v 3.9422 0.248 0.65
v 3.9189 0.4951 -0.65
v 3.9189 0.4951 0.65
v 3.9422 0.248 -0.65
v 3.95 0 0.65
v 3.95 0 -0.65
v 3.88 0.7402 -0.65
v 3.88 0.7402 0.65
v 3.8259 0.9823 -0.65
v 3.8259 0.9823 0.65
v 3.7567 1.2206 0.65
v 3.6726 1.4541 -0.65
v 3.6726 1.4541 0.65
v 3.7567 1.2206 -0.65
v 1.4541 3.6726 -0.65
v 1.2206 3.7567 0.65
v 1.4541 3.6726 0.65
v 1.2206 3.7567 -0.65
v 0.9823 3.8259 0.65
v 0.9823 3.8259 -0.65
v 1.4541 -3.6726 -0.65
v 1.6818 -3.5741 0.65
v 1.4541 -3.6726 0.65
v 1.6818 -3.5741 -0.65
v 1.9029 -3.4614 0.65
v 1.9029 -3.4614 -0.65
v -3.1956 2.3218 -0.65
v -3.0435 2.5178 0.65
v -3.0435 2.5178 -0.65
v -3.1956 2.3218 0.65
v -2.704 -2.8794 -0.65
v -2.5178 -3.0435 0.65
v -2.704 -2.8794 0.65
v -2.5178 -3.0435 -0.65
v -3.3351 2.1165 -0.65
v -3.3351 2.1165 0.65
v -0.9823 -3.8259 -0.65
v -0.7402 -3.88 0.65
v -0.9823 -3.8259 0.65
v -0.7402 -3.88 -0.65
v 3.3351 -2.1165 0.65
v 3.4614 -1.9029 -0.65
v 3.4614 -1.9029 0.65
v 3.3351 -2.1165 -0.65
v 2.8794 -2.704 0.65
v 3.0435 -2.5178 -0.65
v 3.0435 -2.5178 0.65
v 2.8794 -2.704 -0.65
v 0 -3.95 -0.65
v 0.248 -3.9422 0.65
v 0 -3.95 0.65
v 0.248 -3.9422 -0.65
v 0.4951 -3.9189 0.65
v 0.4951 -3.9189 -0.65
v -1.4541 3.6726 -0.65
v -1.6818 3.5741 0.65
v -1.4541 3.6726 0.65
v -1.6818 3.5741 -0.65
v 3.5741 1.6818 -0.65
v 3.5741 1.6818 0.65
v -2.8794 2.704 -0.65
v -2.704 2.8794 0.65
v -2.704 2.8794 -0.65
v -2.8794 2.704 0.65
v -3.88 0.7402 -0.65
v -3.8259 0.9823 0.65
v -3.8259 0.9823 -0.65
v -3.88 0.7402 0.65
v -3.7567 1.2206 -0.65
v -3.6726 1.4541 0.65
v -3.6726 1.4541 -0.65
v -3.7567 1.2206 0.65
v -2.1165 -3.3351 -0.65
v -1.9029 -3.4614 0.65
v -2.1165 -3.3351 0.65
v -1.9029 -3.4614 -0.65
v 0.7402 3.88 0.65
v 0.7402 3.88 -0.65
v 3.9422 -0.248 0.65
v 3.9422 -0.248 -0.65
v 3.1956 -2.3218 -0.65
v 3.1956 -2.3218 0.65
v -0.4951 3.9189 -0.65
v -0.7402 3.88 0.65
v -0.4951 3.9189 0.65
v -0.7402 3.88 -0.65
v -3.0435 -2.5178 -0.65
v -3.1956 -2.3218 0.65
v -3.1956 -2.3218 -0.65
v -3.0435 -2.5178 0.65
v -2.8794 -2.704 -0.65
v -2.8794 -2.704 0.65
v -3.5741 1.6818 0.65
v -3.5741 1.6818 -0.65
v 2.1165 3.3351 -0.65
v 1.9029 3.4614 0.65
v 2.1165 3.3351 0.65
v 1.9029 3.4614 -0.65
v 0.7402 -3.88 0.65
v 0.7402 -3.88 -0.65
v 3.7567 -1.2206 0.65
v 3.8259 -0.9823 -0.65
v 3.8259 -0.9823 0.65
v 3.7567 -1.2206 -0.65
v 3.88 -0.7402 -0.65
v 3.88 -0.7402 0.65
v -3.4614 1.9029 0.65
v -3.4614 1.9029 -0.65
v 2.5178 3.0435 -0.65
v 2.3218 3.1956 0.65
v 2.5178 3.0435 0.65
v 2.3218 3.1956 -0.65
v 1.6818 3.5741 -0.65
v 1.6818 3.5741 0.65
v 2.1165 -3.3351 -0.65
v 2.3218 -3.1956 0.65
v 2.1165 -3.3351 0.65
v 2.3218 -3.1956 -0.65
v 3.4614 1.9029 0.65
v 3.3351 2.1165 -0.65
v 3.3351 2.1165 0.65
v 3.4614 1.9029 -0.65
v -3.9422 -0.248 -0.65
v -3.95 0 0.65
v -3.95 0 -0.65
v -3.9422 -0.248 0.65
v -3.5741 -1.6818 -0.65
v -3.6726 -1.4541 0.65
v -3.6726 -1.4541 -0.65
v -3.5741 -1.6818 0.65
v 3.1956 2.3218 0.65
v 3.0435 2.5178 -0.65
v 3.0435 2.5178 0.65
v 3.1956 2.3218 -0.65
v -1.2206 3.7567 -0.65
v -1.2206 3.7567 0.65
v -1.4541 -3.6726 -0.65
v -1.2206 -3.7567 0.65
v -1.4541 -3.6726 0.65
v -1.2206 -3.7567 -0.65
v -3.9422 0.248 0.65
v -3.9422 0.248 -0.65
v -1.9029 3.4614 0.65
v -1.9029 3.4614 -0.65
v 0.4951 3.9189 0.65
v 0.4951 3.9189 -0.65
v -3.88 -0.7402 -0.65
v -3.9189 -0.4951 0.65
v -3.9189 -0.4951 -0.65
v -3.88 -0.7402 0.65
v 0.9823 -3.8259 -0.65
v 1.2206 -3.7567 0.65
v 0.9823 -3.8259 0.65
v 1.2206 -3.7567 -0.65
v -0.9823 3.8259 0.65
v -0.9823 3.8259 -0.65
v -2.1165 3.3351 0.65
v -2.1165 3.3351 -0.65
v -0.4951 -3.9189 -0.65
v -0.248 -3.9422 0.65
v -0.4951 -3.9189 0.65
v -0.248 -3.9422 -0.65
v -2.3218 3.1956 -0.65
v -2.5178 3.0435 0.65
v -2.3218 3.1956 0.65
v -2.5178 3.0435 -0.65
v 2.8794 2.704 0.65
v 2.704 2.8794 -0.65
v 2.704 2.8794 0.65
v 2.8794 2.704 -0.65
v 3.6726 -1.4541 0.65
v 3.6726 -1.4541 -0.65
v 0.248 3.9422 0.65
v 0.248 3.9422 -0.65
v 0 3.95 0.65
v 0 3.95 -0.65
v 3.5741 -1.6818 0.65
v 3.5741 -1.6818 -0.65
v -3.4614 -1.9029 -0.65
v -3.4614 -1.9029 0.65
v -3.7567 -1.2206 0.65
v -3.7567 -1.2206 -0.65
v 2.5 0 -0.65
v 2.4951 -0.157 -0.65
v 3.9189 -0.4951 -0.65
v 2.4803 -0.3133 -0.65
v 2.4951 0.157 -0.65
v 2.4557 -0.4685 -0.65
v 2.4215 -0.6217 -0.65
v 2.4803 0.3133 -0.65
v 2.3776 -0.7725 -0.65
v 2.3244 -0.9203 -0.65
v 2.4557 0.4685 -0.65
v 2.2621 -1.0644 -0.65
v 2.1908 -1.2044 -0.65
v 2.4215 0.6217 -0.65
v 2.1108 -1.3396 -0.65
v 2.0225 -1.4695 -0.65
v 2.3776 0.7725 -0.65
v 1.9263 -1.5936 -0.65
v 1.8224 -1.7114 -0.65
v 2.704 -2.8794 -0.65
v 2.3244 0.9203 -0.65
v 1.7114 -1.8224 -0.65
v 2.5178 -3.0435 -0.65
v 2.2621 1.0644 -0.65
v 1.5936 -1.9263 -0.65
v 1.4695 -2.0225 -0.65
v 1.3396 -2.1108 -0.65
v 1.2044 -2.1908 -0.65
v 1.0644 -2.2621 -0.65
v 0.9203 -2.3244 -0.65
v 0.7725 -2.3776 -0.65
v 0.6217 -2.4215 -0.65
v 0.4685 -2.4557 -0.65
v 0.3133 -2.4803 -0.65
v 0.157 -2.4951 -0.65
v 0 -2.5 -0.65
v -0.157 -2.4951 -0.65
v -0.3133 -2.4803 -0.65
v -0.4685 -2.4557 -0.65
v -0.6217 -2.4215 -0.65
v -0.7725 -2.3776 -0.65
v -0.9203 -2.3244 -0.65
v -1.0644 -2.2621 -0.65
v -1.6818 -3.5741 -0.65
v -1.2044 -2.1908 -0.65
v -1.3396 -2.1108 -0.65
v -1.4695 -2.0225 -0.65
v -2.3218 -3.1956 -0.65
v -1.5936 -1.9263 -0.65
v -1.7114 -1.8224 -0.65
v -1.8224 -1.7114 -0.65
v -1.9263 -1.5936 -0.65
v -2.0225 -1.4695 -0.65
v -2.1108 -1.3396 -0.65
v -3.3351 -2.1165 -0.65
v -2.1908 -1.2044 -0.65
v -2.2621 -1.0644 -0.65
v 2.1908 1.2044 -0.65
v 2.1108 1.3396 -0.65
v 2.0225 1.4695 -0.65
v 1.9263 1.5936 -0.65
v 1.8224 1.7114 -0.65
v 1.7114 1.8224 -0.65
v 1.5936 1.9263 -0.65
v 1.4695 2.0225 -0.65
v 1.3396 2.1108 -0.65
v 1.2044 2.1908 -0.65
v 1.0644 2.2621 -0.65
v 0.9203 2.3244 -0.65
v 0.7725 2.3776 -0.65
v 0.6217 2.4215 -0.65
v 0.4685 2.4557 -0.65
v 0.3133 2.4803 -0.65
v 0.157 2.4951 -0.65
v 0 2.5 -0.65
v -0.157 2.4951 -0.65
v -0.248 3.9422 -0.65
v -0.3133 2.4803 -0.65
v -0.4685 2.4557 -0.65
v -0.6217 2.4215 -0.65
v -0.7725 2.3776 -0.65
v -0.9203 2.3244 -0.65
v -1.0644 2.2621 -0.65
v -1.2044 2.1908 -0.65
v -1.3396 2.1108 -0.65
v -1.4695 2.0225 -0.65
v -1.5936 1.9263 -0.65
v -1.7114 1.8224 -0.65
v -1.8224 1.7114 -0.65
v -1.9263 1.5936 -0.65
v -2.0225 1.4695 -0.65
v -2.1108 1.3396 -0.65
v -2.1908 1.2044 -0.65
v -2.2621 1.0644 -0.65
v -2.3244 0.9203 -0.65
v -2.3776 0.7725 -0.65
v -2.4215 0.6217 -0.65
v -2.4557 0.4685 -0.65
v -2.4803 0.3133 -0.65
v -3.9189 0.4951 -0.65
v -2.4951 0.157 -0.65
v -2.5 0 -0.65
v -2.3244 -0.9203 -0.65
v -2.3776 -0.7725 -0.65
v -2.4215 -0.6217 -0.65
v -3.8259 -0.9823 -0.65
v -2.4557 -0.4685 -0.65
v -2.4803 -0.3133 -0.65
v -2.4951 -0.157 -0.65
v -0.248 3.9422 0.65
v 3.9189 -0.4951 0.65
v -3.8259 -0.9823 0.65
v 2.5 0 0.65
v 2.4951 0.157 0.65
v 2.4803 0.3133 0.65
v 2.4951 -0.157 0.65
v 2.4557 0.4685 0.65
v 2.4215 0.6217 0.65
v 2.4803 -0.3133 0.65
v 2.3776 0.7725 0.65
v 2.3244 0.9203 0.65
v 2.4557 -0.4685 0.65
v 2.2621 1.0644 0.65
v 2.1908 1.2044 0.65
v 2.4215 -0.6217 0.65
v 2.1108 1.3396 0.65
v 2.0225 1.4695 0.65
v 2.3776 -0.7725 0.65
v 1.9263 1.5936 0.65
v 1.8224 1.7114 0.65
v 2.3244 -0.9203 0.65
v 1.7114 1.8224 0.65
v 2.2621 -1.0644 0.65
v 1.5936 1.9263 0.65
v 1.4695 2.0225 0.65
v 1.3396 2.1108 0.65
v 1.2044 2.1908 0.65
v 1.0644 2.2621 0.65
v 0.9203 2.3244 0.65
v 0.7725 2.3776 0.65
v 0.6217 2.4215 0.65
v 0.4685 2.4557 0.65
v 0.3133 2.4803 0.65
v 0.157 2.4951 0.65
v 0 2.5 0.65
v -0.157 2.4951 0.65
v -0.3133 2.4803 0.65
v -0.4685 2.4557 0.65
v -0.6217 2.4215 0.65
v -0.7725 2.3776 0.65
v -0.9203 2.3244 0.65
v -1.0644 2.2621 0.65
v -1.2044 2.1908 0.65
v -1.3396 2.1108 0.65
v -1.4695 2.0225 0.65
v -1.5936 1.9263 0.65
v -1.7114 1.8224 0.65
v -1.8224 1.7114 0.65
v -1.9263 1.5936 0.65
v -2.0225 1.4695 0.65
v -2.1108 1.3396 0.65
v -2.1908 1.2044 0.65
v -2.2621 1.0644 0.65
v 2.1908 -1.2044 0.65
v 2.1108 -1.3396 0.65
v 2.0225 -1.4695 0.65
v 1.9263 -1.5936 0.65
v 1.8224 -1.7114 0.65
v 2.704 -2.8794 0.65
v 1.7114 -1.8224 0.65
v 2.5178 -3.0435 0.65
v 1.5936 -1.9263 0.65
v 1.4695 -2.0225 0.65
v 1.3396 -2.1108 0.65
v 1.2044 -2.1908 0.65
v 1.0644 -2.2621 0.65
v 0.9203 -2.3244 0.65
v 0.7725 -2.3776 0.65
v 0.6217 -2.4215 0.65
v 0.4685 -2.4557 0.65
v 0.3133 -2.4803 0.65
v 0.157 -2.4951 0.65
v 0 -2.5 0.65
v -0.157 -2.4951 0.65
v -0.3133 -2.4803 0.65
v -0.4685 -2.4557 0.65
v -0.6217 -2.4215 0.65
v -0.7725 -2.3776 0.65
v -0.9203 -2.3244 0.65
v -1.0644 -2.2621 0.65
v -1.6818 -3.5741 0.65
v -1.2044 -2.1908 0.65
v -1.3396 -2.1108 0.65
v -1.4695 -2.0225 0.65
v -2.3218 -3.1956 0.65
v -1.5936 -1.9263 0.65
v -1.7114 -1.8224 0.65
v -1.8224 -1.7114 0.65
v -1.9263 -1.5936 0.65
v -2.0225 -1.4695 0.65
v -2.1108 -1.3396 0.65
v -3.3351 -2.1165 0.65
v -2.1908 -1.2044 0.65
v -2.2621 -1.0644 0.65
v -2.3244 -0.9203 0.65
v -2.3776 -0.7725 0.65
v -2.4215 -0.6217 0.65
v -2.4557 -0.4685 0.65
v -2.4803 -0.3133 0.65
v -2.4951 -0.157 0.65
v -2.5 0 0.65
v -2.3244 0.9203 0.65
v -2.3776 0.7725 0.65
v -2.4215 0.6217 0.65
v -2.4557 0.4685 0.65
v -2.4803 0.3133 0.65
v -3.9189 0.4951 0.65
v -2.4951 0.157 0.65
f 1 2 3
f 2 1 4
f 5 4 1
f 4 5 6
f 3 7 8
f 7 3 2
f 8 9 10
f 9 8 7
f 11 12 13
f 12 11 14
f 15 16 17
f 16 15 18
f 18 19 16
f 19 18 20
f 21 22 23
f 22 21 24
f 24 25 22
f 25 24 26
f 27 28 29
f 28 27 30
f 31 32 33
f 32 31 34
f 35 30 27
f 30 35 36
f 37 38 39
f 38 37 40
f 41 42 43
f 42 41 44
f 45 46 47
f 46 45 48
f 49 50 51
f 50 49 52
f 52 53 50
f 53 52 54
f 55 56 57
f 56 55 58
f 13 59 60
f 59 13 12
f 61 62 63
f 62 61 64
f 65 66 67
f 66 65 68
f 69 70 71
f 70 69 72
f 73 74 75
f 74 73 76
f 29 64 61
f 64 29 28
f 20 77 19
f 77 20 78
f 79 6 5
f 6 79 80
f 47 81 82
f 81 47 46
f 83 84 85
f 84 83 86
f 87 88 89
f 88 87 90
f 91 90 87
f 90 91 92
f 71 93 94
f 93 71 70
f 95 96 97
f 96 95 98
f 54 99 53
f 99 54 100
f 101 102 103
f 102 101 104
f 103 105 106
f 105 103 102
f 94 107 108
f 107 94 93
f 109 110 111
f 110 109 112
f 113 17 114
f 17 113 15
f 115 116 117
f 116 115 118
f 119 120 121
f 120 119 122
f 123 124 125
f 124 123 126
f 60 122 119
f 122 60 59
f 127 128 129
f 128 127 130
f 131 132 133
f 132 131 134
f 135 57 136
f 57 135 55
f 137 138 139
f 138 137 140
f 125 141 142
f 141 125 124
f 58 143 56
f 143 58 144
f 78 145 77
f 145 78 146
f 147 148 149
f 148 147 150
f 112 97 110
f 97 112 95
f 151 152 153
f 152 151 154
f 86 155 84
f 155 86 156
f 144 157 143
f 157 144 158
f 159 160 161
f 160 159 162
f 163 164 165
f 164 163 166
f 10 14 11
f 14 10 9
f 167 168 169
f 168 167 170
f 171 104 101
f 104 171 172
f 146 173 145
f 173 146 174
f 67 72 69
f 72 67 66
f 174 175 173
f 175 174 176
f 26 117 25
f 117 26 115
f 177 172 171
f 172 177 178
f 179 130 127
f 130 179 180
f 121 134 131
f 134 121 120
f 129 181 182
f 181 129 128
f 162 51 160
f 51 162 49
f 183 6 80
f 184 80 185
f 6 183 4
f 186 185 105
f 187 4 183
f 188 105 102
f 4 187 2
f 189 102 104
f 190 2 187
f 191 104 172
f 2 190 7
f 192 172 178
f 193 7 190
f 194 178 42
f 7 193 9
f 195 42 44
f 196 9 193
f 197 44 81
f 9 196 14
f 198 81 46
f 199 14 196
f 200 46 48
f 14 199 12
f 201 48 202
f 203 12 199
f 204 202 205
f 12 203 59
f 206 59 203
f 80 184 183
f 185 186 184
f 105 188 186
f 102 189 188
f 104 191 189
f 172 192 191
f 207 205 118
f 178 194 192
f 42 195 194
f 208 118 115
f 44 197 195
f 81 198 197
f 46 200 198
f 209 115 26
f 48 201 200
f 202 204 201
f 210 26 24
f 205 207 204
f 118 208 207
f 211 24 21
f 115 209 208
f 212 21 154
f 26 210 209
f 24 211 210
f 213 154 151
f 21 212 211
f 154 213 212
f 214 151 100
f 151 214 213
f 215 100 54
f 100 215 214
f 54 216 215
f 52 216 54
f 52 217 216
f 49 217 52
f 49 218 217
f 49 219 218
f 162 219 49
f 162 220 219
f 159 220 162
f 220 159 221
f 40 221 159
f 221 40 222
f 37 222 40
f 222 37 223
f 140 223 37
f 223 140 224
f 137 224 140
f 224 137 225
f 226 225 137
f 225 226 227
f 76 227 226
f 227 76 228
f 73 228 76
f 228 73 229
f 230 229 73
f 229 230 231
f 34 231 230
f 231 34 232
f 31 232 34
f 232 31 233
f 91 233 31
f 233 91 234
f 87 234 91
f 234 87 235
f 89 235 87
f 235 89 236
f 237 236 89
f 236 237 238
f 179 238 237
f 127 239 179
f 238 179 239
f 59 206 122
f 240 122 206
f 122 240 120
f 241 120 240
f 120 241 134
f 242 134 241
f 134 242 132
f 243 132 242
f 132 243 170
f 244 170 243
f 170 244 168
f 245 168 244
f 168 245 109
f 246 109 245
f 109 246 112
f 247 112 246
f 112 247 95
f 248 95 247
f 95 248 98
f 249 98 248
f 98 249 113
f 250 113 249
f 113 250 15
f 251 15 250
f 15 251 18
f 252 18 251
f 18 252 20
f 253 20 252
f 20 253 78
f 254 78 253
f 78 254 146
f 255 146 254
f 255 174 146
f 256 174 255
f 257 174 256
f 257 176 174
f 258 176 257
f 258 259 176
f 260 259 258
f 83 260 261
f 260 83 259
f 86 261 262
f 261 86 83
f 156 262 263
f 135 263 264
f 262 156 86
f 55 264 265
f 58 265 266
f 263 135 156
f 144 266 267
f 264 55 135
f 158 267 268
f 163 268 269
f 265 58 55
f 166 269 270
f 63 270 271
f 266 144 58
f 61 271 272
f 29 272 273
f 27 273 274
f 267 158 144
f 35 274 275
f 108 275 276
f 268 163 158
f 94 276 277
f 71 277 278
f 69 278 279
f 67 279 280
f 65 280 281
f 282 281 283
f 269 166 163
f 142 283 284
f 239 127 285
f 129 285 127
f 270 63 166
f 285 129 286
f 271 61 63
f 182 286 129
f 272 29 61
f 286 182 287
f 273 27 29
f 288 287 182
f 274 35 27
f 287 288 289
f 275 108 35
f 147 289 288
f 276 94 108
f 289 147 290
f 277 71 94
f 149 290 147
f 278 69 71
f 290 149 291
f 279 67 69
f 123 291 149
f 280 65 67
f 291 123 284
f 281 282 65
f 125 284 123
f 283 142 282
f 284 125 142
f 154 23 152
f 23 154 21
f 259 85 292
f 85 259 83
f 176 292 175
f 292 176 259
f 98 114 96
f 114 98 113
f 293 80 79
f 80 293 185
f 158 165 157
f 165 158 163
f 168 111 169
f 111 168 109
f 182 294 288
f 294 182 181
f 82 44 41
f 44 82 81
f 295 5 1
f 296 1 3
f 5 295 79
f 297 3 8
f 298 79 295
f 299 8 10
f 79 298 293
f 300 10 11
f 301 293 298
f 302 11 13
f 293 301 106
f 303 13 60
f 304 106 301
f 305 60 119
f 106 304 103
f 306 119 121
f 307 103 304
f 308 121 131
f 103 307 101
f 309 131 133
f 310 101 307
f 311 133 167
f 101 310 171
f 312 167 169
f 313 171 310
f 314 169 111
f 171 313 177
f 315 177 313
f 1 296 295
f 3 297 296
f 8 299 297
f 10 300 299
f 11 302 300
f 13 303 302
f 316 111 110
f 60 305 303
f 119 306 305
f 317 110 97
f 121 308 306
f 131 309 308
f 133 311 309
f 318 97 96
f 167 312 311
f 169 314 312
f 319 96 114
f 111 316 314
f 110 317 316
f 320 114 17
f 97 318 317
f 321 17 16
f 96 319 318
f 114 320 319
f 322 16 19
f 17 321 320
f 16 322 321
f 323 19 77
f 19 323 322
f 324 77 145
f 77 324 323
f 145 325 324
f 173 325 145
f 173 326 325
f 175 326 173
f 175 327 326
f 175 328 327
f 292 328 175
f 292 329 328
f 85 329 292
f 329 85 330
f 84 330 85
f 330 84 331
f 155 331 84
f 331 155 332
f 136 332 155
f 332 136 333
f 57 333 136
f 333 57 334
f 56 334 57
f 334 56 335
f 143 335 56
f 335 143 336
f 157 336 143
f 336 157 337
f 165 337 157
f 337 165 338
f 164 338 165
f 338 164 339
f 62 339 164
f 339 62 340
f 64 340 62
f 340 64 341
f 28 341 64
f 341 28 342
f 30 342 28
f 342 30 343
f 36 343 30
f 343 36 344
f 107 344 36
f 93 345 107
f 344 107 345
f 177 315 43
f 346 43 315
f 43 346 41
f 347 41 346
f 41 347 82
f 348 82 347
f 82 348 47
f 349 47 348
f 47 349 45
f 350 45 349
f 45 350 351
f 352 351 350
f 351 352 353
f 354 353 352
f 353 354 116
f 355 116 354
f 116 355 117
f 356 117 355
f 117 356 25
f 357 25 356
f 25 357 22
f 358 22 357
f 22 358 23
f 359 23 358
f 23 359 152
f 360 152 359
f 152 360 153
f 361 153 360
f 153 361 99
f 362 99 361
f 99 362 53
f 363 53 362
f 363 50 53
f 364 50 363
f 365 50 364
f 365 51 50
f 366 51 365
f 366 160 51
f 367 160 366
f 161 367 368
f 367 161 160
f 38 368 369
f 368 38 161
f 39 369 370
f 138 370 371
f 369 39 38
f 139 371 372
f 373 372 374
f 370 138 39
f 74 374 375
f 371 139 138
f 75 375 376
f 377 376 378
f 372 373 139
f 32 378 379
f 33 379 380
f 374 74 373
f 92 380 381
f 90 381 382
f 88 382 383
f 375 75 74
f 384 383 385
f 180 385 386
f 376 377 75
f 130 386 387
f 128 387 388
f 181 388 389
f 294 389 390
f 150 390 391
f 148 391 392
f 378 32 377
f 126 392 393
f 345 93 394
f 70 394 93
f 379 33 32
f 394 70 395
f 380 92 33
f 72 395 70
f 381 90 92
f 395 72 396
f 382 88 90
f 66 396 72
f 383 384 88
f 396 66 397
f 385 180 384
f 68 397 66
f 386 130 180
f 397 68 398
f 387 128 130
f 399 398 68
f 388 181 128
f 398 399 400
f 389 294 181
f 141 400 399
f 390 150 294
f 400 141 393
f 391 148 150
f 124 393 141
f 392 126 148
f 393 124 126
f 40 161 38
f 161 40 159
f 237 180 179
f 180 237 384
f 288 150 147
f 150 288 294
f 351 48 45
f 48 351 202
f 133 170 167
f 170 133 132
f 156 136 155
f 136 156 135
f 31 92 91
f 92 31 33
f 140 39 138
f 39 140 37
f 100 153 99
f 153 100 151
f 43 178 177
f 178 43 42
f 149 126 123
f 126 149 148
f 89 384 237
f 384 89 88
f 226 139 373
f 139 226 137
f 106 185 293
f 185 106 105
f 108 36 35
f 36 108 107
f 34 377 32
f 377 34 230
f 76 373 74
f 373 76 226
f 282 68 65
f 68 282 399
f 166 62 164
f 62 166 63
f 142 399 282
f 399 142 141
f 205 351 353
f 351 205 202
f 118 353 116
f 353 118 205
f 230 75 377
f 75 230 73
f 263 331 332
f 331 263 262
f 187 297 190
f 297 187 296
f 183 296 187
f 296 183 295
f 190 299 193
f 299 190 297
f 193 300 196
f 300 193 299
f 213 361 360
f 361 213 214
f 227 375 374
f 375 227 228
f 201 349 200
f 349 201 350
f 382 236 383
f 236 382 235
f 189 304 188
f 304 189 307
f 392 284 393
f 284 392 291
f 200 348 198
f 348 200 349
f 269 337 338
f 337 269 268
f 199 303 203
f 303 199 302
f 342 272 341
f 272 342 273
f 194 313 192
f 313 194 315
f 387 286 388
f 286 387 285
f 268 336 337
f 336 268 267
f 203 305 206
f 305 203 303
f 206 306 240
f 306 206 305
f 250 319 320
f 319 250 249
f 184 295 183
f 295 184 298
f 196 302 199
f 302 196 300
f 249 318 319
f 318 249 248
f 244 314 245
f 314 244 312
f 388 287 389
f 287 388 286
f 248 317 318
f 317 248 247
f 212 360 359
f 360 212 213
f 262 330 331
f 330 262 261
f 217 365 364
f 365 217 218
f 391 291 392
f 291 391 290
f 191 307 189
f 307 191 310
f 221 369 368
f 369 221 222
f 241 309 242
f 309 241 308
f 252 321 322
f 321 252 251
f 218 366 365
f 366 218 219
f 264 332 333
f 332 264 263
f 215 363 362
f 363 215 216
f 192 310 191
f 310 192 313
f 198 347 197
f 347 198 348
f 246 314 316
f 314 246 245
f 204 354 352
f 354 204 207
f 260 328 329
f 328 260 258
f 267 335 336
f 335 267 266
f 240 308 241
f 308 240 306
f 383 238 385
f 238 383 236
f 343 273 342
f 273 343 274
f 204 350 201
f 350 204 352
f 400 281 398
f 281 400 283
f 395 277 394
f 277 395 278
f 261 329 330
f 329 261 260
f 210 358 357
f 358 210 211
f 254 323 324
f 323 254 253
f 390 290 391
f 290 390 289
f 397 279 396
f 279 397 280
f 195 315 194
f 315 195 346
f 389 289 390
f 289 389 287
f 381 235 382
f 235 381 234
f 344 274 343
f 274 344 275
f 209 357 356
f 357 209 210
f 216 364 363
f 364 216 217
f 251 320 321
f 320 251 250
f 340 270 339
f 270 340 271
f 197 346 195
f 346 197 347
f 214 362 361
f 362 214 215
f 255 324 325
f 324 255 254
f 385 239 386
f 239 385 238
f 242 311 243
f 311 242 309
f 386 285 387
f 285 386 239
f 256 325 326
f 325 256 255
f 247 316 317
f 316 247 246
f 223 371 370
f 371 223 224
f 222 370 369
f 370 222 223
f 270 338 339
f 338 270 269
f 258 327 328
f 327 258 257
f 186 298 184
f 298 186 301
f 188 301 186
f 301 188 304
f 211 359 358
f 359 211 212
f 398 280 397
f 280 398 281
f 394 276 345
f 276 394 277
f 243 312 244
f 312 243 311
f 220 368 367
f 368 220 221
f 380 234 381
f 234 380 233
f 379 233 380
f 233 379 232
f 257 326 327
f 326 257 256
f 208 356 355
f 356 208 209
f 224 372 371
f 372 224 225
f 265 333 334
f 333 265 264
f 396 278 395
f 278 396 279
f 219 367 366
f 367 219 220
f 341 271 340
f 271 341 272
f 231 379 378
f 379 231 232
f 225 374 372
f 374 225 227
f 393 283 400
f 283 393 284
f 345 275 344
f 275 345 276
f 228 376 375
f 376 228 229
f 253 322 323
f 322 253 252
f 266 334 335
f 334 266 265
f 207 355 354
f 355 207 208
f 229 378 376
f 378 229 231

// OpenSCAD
// file: ../configuration.scad
$fn=40; // model faces resolution.

//OBECNE PARAMETRY 
//----------------------------------------------------------------
//----------------------------------------------------------------
//WINDGAUGE02A_S02 - Parametry pro hlavni valec anemometru
S01_hloubka_zavitu=4;
S01_vyska=80;
S01_prumer_vnitrni=40;
S01_sila_materialu=1.3;
S01_vyska_horni_zavit=10;
S01_vyska_spodniho_zavitu=10;
S01_sila_drzaku_RJ11=3; //vyška drážky
S01_hrana_A_RJ11=12.3;
S01_hrana_B_RJ11=19;
S01_tolerance_zavit=1.5;

//Obecné parametry
prumer_osicky=5;
sterbina_na_osicku=0.5; //aby nepraskal a držel držák rotoru na hřídelce

//Rozmery modulu se senzorem
senzor_delka=20.32;
senzor_sirka=10.16;
senzor_vyska_IO=2;
senzor_odstup_od_magnetu=2;

//Parametry loziska
lozisko_prumer_vnitrni=4.9;
lozisko_prumer_vnejsi=16.1;
lozisko_vyska=5;
lozisko_prekryv=1.5;

//Parametry magnetu
magnet_prumer=6.3;
magnet_vyska=5;
magnet_zapusteni=4;
magnet_tolerance_prumeru=0.2;

R03_vyska_narezeni_hridelky=5;

//Parametry sroubu
prumer_sroubu=3.4;
prumer_hlavy_sroubu=6;
vyska_hlavy_sroubu=4;
vyska_matky=3;
sirka_matky=6.7;

sirka_matky_tol=0.175;
prumer_orechu=10;

//WINDGAUGE02A_R01 //pro lopatku
L01_hrana_drzaku_a=10;
L01_hrana_drzaku_b=3;
L01_delka_uchytu=20;
L01_prumer_lopatky=40;
L01_sila_materialu_lopatky=1.2;

//WINDGAUGE02A_D01 //uchyt velky
D01_material_pod_zavitem=5;
D01_material_za_zavitem=3;
D01_material_pred_zavitem=2;
D01_delka_tyce=60;
D01_sirka_tyce=10;

//WINDGAUGE02A_D02 //uchyt na sloup
D02_sila_materialu=6;
D02_vyska_uchytky=40;
D02_prumer_obruby=27; 

//27mm - 3/4 trubka
D02_delka_celeho_uchytu=60;
D02_dotahova_vzdalenost=1.5;
D02_prumer_uchytneho_sroubu=4.2;
D02_sirka_matky=9.1; //pro M4
D02_vyska_matky=3;

//WINDGAUGE02A_R01 //rotor s prekritim statoru
R01_vyska_preryti_statoru=10;
R01_sila_materialu_pro_prekriti=1.3;
R01_mezera_mezi_statorem_rotorem=3;

//WINDGAUGE02A_R03 //drzak magnetu
R05_sirka_matky=10;
// main file
$fn=40; // model faces resolution.
include <../configuration.scad>

//podložka u ložiska - nahrazena kovovou
module WINDGAUGE02A_R04 ()
    {
    difference()
        {
        union()
            {
            translate([0,0,0])
                cylinder (h = S01_sila_materialu, r=(lozisko_prumer_vnitrni+2*lozisko_prekryv)/2, center = true, $fn=100); 
            }    
   
        translate([0,0,1/2*S01_sila_materialu-(lozisko_vyska)/2])             
            cylinder (h = 2*S01_sila_materialu+lozisko_vyska+0.1, r=((prumer_osicky)/2), center = true, $fn=100);   
        }
    }
 
 WINDGAUGE02A_R04 ();
